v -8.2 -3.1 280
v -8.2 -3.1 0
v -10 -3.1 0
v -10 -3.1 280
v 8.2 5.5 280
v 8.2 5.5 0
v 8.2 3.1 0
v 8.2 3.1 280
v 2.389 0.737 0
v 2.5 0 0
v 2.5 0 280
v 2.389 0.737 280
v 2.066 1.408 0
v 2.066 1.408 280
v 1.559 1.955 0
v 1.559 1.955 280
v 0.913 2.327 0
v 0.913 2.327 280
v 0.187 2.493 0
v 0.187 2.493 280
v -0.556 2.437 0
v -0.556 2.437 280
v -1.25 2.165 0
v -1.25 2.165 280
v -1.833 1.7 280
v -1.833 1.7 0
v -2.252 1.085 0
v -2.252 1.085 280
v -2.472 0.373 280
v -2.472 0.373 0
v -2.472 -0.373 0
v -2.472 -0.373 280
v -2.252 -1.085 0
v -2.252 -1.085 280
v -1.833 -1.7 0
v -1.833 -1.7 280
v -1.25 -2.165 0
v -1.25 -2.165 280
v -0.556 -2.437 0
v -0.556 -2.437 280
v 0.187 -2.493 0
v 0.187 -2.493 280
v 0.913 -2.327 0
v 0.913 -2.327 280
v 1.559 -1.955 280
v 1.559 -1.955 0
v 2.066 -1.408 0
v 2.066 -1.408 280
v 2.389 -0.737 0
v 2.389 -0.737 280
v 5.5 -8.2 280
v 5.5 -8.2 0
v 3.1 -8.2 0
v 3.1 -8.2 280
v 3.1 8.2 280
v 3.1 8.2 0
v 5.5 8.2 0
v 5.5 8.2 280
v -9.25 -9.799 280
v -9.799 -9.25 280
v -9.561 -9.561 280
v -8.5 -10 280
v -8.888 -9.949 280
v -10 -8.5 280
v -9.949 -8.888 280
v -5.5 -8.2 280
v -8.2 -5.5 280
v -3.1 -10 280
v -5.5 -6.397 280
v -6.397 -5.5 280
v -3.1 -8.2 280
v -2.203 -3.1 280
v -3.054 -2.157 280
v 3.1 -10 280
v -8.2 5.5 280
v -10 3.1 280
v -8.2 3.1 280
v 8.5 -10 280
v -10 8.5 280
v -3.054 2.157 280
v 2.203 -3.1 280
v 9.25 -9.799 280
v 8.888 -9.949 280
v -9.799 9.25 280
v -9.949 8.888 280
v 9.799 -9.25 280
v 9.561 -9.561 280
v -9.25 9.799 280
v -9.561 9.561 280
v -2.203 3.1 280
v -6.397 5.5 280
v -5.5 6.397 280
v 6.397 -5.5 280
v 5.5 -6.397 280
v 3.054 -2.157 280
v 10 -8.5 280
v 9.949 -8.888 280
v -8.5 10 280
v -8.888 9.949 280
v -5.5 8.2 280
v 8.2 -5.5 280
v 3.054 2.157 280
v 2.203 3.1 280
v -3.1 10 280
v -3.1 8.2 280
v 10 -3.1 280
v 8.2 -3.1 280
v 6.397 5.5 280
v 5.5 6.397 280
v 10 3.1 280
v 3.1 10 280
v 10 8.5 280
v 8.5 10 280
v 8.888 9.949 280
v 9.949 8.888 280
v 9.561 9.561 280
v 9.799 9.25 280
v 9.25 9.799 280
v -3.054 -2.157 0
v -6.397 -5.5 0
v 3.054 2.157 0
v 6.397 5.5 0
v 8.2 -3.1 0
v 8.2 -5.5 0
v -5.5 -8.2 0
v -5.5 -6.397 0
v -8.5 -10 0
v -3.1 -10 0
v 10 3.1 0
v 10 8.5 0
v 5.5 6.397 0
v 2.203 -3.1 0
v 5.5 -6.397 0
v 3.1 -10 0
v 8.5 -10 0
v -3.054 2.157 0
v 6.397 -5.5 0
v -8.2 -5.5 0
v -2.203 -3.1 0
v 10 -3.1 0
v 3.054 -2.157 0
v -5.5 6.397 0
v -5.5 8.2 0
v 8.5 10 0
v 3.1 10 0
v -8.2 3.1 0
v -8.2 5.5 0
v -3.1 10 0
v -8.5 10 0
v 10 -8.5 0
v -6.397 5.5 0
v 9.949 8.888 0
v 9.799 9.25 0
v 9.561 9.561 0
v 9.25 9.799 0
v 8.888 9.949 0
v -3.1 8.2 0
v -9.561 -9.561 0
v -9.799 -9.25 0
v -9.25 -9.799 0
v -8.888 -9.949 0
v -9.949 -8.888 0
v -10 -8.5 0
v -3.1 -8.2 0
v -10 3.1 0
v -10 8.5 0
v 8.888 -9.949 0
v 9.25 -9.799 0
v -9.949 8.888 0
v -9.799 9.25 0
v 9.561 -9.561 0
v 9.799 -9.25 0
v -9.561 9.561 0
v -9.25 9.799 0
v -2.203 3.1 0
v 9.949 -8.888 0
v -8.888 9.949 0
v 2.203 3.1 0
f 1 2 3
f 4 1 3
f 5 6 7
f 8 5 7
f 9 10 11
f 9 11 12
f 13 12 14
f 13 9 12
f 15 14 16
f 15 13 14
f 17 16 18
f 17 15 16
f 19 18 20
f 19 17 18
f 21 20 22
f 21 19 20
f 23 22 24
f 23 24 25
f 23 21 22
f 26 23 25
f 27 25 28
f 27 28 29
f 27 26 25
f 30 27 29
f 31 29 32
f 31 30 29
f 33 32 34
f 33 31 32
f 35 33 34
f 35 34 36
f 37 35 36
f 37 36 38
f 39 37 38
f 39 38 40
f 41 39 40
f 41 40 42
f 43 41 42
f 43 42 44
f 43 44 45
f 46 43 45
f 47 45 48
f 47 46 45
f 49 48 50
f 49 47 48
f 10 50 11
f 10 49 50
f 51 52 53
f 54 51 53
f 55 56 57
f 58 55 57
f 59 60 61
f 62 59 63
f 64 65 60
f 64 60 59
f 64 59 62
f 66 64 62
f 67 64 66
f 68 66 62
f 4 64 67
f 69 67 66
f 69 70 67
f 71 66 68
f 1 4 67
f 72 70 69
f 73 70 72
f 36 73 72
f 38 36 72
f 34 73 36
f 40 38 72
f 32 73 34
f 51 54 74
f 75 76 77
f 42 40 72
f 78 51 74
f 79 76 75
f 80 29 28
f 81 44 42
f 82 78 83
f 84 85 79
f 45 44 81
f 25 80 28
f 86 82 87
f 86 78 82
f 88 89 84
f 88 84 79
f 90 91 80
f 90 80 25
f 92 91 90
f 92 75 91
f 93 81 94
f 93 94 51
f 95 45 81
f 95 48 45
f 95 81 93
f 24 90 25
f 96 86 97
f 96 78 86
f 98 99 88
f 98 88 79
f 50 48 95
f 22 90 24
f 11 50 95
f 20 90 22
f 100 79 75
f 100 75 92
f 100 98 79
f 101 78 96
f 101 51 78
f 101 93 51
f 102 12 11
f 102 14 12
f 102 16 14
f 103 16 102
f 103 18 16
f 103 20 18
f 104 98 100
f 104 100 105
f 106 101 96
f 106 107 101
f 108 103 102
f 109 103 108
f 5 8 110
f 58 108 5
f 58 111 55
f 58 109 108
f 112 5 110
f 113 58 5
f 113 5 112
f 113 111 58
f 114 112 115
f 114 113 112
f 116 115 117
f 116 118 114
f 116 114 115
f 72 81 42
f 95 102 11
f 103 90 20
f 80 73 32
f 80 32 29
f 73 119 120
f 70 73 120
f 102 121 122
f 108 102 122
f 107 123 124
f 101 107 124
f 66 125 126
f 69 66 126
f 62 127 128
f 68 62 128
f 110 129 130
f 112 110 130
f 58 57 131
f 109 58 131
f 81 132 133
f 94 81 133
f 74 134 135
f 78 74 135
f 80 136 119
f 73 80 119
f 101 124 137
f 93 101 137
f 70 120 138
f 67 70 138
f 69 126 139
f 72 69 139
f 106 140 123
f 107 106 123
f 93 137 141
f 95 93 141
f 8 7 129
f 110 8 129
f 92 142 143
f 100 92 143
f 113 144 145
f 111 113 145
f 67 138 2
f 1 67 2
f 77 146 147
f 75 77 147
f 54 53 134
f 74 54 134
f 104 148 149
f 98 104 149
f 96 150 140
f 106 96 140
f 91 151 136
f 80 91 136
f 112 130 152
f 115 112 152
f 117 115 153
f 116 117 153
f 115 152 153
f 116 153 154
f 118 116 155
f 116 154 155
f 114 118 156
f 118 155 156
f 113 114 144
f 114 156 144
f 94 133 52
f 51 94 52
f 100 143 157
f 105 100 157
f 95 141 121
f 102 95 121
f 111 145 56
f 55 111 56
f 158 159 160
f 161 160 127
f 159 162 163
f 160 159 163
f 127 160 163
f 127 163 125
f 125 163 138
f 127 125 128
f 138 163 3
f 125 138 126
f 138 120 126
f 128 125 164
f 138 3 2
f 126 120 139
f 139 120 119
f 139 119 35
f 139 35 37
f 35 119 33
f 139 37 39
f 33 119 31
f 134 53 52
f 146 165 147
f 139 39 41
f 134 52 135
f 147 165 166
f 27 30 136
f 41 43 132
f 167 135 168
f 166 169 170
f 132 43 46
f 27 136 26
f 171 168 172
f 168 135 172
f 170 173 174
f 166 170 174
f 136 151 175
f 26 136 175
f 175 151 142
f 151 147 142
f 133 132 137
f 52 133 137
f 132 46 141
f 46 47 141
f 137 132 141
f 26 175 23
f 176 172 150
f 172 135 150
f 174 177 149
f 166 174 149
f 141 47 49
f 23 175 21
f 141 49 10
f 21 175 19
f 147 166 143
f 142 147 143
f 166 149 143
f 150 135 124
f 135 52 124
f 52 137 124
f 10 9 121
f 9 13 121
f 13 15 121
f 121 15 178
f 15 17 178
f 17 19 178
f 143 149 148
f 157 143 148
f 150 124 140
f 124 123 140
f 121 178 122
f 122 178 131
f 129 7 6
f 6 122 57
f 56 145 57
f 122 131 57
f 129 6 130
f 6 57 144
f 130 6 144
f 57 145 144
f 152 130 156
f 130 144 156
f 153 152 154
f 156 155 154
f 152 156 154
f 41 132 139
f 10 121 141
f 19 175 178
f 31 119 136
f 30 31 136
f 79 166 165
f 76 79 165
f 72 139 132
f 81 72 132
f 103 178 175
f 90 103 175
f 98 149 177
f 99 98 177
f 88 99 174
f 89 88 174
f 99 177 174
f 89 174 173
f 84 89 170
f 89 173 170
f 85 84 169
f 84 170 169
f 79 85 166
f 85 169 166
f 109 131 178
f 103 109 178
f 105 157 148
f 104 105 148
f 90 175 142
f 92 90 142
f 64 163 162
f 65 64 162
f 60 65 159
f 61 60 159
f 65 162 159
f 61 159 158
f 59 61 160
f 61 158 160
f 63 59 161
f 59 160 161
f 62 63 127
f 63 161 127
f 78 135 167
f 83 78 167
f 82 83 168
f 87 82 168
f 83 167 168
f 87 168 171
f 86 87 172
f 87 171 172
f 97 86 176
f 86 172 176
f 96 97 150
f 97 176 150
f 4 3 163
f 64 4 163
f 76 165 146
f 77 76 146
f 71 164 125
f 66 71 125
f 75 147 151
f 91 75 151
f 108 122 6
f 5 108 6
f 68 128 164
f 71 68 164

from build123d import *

# Parameters (mm, degrees)
SKETCH_1_R      = 2.5
EXTRUDE_1_DEPTH = 280


with BuildPart() as part:
    # 草图1 → 凸台-拉伸1 (new body)
    with BuildSketch(Plane.XY):
        with BuildLine():
            Line((-8.2, -3.1), (-10, -3.1))
            Line((-10, -3.1), (-10, -8.5))
            ThreePointArc((-10, -8.5), (-9.560660172, -9.560660172), (-8.5, -10))
            Line((-8.5, -10), (-3.1, -10))
            Line((-3.1, -10), (-3.1, -8.2))
            Line((-3.1, -8.2), (-5.5, -8.2))
            Line((-5.5, -8.2), (-5.5, -6.397050155))
            Line((-5.5, -6.397050155), (-2.202949845, -3.1))
            Line((-2.202949845, -3.1), (2.202949845, -3.1))
            Line((2.202949845, -3.1), (5.5, -6.397050155))
            Line((5.5, -6.397050155), (5.5, -8.2))
            Line((5.5, -8.2), (3.1, -8.2))
            Line((3.1, -8.2), (3.1, -10))
            Line((3.1, -10), (8.5, -10))
            ThreePointArc((8.5, -10), (9.560660172, -9.560660172), (10, -8.5))
            Line((10, -8.5), (10, -3.1))
            Line((10, -3.1), (8.2, -3.1))
            Line((8.2, -3.1), (8.2, -5.5))
            Line((8.2, -5.5), (6.397050155, -5.5))
            Line((6.397050155, -5.5), (3.05412702, -2.157076865))
            Line((3.05412702, -2.157076865), (3.05412702, 2.157076865))
            Line((3.05412702, 2.157076865), (6.397050155, 5.5))
            Line((6.397050155, 5.5), (8.2, 5.5))
            Line((8.2, 5.5), (8.2, 3.1))
            Line((8.2, 3.1), (10, 3.1))
            Line((10, 3.1), (10, 8.5))
            ThreePointArc((10, 8.5), (9.560660172, 9.560660172), (8.5, 10))
            Line((8.5, 10), (3.1, 10))
            Line((3.1, 10), (3.1, 8.2))
            Line((3.1, 8.2), (5.5, 8.2))
            Line((5.5, 8.2), (5.5, 6.397050155))
            Line((5.5, 6.397050155), (2.202949845, 3.1))
            Line((2.202949845, 3.1), (-2.202949845, 3.1))
            Line((-2.202949845, 3.1), (-5.5, 6.397050155))
            Line((-5.5, 6.397050155), (-5.5, 8.2))
            Line((-5.5, 8.2), (-3.1, 8.2))
            Line((-3.1, 8.2), (-3.1, 10))
            Line((-3.1, 10), (-8.5, 10))
            ThreePointArc((-8.5, 10), (-9.560660172, 9.560660172), (-10, 8.5))
            Line((-10, 8.5), (-10, 3.1))
            Line((-10, 3.1), (-8.2, 3.1))
            Line((-8.2, 3.1), (-8.2, 5.5))
            Line((-8.2, 5.5), (-6.397050155, 5.5))
            Line((-6.397050155, 5.5), (-3.05412702, 2.157076865))
            Line((-3.05412702, 2.157076865), (-3.05412702, -2.157076865))
            Line((-3.05412702, -2.157076865), (-6.397050155, -5.5))
            Line((-6.397050155, -5.5), (-8.2, -5.5))
            Line((-8.2, -5.5), (-8.2, -3.1))
        make_face()
        Circle(SKETCH_1_R, mode=Mode.SUBTRACT)
    extrude(amount=EXTRUDE_1_DEPTH)


solid = part.part
